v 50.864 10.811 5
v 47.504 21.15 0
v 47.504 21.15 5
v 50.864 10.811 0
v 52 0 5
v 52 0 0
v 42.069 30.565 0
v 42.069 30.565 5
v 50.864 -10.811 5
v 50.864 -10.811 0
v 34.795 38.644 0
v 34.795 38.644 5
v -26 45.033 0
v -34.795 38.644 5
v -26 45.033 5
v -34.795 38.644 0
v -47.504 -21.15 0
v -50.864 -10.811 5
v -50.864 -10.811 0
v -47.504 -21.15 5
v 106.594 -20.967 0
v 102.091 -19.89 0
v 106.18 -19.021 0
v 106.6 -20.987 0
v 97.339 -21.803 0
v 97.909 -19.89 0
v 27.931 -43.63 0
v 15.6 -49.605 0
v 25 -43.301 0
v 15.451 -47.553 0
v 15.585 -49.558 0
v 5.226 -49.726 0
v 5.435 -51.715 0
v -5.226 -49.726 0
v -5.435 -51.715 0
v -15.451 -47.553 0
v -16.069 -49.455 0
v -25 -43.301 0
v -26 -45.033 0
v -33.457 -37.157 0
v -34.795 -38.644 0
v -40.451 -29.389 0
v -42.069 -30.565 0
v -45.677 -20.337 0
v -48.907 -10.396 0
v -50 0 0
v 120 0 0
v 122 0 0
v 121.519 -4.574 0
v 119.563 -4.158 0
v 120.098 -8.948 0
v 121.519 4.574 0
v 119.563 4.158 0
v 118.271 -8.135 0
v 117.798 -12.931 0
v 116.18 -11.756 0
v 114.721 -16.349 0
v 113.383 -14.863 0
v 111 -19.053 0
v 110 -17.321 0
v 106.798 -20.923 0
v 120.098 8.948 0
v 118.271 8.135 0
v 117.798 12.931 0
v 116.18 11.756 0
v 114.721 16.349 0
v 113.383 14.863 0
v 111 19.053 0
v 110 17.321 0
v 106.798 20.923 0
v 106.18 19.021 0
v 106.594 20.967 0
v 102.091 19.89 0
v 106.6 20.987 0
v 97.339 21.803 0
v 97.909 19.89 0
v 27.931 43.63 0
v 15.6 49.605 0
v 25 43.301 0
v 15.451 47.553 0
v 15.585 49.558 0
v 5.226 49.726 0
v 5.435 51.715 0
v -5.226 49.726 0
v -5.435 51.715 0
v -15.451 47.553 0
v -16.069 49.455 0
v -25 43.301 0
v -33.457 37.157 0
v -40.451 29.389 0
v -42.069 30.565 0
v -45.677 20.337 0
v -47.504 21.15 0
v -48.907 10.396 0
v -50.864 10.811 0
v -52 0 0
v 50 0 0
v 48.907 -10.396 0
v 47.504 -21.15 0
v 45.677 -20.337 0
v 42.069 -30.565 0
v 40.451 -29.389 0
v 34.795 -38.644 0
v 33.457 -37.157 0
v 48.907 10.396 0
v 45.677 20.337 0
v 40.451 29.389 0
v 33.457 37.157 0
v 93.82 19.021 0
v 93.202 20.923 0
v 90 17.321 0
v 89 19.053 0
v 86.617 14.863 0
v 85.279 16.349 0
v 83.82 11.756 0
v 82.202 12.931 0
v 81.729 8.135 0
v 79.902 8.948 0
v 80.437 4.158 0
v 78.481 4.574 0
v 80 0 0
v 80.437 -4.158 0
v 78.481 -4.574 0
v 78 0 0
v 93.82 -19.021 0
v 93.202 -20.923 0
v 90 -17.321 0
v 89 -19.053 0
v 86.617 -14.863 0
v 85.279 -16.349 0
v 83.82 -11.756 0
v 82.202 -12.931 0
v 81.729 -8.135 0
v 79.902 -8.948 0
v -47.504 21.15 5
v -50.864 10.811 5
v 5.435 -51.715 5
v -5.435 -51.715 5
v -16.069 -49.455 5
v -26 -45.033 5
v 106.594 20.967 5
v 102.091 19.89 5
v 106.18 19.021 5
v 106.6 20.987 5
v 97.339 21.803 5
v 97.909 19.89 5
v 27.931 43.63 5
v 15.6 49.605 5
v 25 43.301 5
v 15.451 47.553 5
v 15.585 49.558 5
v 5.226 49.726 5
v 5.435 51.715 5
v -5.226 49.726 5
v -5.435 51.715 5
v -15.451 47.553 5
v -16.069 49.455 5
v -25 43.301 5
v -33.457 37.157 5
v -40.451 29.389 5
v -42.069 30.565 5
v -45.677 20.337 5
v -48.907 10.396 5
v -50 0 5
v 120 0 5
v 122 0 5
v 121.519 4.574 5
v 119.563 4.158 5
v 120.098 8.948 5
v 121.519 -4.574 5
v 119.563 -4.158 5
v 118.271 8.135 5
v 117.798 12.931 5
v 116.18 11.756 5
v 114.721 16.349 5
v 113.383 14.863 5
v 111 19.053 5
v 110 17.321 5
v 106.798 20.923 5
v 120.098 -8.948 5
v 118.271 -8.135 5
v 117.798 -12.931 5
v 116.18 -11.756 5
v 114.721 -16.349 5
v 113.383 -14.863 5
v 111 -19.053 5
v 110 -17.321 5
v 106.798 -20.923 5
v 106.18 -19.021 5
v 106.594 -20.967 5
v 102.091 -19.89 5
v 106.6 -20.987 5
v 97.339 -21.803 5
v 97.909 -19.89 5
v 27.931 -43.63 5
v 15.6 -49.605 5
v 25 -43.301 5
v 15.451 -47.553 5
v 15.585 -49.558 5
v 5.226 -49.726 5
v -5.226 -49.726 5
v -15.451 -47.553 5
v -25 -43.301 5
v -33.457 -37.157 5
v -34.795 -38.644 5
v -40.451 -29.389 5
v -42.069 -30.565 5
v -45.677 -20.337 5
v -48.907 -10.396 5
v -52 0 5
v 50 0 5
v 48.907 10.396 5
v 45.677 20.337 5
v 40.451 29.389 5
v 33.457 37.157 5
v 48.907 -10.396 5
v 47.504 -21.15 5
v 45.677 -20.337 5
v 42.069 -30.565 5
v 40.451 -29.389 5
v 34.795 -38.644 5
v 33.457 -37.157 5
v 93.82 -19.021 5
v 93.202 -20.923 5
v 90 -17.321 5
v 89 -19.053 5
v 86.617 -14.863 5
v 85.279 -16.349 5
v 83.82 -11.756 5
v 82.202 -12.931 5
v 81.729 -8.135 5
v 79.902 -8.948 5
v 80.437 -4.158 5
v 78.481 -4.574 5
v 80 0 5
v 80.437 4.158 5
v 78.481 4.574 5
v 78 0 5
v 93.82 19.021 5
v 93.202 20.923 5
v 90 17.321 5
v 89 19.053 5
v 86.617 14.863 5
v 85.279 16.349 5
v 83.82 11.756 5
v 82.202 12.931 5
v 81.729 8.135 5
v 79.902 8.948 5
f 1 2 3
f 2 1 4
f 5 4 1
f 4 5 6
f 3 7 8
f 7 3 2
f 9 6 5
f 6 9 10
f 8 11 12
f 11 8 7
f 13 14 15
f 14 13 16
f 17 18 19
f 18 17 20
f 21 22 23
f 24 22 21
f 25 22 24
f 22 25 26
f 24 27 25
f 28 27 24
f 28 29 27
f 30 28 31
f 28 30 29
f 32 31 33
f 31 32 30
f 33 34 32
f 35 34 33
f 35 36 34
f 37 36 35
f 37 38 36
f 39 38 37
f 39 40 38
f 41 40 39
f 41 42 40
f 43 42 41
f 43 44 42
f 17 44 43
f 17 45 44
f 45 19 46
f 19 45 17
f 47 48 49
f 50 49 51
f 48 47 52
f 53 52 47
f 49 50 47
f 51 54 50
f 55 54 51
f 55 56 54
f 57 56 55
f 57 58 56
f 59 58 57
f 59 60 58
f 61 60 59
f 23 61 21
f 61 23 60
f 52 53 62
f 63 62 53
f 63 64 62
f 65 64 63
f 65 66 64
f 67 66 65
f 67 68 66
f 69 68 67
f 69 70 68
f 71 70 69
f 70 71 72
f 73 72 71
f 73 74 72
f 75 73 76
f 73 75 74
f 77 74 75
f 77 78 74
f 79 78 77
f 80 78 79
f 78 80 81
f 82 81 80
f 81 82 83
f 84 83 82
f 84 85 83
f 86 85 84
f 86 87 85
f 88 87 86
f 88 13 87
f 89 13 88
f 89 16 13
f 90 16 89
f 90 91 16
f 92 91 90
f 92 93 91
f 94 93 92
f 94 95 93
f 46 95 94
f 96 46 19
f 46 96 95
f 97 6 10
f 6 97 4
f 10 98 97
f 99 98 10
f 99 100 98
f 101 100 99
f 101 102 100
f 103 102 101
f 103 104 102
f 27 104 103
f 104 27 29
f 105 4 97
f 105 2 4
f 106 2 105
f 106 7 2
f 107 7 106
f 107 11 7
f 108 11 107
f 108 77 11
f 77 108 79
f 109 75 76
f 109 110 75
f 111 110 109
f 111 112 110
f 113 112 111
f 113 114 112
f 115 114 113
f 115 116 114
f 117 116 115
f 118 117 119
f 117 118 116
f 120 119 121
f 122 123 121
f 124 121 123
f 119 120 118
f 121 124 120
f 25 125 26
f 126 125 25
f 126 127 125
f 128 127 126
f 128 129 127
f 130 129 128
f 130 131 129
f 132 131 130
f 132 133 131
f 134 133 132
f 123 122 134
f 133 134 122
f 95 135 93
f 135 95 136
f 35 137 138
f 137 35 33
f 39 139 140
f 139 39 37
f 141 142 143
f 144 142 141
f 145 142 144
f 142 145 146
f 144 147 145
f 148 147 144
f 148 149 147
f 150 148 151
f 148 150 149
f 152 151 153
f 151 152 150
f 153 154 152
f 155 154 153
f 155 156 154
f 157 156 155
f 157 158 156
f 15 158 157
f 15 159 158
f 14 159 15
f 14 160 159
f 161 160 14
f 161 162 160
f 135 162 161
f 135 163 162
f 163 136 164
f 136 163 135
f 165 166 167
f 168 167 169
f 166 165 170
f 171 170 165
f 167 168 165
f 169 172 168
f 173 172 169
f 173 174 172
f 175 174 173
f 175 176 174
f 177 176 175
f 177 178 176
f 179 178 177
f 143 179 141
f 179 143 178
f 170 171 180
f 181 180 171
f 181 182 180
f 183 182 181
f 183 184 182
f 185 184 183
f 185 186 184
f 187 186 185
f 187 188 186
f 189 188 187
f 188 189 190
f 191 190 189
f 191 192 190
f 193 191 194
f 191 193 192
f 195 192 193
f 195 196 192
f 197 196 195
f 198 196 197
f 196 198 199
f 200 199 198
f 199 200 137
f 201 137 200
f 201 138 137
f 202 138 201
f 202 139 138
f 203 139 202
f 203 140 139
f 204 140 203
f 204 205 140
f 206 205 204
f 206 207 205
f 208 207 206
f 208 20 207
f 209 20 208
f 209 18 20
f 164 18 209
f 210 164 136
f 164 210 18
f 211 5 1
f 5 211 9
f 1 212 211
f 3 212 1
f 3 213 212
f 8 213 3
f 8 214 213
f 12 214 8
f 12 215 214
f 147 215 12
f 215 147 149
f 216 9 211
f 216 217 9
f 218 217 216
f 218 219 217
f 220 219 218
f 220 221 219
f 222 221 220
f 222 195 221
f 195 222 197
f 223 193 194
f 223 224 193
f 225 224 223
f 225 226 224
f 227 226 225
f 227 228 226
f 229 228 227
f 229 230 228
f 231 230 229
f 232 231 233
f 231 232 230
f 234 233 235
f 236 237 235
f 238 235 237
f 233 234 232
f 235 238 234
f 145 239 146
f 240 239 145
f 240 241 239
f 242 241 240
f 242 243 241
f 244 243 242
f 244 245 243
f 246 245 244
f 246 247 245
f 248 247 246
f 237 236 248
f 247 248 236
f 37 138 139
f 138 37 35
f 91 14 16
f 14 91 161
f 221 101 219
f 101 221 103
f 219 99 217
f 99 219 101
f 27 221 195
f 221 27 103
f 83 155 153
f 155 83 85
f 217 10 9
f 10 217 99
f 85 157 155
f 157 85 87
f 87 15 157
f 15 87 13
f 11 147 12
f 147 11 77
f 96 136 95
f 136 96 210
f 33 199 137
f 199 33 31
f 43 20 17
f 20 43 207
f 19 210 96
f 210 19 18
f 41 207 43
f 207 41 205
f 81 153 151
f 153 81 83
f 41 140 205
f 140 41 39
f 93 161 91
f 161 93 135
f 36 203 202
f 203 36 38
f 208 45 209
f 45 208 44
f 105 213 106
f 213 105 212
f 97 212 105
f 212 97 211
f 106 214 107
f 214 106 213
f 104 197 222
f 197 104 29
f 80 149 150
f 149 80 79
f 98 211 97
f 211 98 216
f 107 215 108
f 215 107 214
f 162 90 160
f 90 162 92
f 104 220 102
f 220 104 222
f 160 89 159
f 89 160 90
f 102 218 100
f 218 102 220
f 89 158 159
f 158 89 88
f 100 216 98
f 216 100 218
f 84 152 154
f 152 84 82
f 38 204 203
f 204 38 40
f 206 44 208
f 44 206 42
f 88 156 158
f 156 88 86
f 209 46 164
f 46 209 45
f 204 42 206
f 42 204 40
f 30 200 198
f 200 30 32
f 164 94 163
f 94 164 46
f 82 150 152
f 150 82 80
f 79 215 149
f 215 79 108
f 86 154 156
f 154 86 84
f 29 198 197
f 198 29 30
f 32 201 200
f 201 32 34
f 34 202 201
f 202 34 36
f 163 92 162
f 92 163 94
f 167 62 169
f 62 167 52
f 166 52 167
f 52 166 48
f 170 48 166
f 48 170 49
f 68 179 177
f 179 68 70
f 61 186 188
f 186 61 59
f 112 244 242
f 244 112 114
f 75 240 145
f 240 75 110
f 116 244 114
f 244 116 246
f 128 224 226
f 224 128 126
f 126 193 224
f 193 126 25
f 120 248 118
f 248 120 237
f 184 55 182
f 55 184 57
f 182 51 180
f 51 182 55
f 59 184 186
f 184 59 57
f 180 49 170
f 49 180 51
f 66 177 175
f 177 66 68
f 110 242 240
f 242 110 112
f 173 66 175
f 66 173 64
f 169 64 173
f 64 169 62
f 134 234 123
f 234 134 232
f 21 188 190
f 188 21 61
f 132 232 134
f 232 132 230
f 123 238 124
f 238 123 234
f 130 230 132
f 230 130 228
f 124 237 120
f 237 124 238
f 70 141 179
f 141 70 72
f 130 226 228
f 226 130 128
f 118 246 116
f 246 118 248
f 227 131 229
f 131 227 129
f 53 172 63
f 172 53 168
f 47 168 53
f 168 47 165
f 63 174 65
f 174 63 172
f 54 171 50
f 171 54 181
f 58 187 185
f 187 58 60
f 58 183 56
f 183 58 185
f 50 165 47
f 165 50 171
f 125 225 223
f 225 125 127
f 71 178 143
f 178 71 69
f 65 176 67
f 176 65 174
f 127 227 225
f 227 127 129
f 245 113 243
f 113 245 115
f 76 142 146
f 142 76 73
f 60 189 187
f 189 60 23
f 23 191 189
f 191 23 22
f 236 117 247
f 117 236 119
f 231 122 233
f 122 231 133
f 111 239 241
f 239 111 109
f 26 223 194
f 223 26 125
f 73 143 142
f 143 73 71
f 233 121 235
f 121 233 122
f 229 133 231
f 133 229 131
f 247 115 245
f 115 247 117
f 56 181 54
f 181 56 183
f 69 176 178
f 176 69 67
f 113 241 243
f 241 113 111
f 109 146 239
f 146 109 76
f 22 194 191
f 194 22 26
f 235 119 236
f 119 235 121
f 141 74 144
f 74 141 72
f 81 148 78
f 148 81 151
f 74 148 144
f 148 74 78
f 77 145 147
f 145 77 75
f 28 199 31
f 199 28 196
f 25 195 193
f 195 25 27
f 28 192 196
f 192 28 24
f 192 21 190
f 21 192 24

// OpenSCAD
// file: params_basic_components.scad
// Author: Mihai Oltean, www.tcreate.org, mihai.oltean@gmail.com
// More details: jenny5.org
// Source: github.com/jenny5-robot
// MIT License
//--------------------------------------------------------------

spring_length = 20;

smooth_rod_8_radius = 4;
smooth_rod_10_radius = 5;
smooth_rod_12_radius = 6;

tolerance = 0.1;
display_tolerance = 1;

overlap_tolerance = 0.01;


wall_thick_1 = 1;
wall_thick_2 = 2;
wall_thick_3 = 3;
wall_thick_4 = 4;
wall_thick_5 = 5;
wall_thick_5_5 = 5.5;
wall_thick_6 = 6;
wall_thick_7 = 7;
wall_thick_8 = 8;
wall_thick_9 = 9;
wall_thick_10 = 10;
wall_thick_12 = 10;

wrench_radius = 11;

ghidaj_radius = 4;
ghidaj_radius_12 = 6;

canal_diameter = 8.22;
canal_height = 2.2;

filament_radius = 0.9;

bowden_tube_radius = 2.5;

m3_tolerance = 0.1;

latura_mare_L = 40;
latura_mica_L = 15;
grosime_perete_L = 3;

latura_L_50x50 = 50;
latura_L_40x40 = 40;

latura_U_50x50 = 50;
latura_U_40x40 = 40;


tolerance_z = [0, 0, tolerance];
tolerance_x = [tolerance, 0, 0];
tolerance_y = [0, tolerance, 0];

display_tolerance_z = [0, 0, display_tolerance];
display_tolerance_x = [display_tolerance, 0, 0];
display_tolerance_y = [0, display_tolerance, 0];

display_tolerance_xz = [display_tolerance, 0, display_tolerance];
display_tolerance_xy = [display_tolerance, display_tolerance, 0];
display_tolerance_yz = [0, display_tolerance, display_tolerance];
// main file
include <params_basic_components.scad>

//------------------------------------------------------------------------
module belt_arc(_r, start_angle, end_angle, belt_width, belt_thick = 2)
{
    difference(){
        color("green")cylinder(r = _r + belt_thick, h = belt_width);
        translate (-display_tolerance_z) cylinder(r = _r, h = belt_width + 2 * display_tolerance);
    }
}
//------------------------------------------------------------------------
module belt_on_2_pulleys(r1, r2, distance_between_pulleys, belt_width, belt_thick = 2)
{
    // r1 >= r2
    //cylinder ( h = belt_width, r = r1);
    
    //translate ([distance_between_pulleys, 0, 0]) cylinder ( h = belt_width, r = r2);
    
    angle = asin((r1 - r2) / distance_between_pulleys);
    belt_length = distance_between_pulleys * cos(angle);
    // belt between pulleys
    translate ([sin(angle) * r1, cos(angle) * r1, 0]) rotate ([0, 0, -angle]) cube([belt_length, belt_thick, belt_width]);
    translate ([sin(angle) * (r1 + belt_thick), cos(180 - angle) * (r1 + belt_thick), 0]) rotate ([0, 0, angle]) cube([belt_length, belt_thick, belt_width]);
    
    // belt around pulley
    belt_arc(r1, angle, 360 - angle, belt_width, belt_thick);
    translate ([distance_between_pulleys, 0, 0]) belt_arc(r2, 360 - angle, angle, belt_width, belt_thick);
}
//------------------------------------------------------------------------
belt_on_2_pulleys(50, 20, 100, 5);
